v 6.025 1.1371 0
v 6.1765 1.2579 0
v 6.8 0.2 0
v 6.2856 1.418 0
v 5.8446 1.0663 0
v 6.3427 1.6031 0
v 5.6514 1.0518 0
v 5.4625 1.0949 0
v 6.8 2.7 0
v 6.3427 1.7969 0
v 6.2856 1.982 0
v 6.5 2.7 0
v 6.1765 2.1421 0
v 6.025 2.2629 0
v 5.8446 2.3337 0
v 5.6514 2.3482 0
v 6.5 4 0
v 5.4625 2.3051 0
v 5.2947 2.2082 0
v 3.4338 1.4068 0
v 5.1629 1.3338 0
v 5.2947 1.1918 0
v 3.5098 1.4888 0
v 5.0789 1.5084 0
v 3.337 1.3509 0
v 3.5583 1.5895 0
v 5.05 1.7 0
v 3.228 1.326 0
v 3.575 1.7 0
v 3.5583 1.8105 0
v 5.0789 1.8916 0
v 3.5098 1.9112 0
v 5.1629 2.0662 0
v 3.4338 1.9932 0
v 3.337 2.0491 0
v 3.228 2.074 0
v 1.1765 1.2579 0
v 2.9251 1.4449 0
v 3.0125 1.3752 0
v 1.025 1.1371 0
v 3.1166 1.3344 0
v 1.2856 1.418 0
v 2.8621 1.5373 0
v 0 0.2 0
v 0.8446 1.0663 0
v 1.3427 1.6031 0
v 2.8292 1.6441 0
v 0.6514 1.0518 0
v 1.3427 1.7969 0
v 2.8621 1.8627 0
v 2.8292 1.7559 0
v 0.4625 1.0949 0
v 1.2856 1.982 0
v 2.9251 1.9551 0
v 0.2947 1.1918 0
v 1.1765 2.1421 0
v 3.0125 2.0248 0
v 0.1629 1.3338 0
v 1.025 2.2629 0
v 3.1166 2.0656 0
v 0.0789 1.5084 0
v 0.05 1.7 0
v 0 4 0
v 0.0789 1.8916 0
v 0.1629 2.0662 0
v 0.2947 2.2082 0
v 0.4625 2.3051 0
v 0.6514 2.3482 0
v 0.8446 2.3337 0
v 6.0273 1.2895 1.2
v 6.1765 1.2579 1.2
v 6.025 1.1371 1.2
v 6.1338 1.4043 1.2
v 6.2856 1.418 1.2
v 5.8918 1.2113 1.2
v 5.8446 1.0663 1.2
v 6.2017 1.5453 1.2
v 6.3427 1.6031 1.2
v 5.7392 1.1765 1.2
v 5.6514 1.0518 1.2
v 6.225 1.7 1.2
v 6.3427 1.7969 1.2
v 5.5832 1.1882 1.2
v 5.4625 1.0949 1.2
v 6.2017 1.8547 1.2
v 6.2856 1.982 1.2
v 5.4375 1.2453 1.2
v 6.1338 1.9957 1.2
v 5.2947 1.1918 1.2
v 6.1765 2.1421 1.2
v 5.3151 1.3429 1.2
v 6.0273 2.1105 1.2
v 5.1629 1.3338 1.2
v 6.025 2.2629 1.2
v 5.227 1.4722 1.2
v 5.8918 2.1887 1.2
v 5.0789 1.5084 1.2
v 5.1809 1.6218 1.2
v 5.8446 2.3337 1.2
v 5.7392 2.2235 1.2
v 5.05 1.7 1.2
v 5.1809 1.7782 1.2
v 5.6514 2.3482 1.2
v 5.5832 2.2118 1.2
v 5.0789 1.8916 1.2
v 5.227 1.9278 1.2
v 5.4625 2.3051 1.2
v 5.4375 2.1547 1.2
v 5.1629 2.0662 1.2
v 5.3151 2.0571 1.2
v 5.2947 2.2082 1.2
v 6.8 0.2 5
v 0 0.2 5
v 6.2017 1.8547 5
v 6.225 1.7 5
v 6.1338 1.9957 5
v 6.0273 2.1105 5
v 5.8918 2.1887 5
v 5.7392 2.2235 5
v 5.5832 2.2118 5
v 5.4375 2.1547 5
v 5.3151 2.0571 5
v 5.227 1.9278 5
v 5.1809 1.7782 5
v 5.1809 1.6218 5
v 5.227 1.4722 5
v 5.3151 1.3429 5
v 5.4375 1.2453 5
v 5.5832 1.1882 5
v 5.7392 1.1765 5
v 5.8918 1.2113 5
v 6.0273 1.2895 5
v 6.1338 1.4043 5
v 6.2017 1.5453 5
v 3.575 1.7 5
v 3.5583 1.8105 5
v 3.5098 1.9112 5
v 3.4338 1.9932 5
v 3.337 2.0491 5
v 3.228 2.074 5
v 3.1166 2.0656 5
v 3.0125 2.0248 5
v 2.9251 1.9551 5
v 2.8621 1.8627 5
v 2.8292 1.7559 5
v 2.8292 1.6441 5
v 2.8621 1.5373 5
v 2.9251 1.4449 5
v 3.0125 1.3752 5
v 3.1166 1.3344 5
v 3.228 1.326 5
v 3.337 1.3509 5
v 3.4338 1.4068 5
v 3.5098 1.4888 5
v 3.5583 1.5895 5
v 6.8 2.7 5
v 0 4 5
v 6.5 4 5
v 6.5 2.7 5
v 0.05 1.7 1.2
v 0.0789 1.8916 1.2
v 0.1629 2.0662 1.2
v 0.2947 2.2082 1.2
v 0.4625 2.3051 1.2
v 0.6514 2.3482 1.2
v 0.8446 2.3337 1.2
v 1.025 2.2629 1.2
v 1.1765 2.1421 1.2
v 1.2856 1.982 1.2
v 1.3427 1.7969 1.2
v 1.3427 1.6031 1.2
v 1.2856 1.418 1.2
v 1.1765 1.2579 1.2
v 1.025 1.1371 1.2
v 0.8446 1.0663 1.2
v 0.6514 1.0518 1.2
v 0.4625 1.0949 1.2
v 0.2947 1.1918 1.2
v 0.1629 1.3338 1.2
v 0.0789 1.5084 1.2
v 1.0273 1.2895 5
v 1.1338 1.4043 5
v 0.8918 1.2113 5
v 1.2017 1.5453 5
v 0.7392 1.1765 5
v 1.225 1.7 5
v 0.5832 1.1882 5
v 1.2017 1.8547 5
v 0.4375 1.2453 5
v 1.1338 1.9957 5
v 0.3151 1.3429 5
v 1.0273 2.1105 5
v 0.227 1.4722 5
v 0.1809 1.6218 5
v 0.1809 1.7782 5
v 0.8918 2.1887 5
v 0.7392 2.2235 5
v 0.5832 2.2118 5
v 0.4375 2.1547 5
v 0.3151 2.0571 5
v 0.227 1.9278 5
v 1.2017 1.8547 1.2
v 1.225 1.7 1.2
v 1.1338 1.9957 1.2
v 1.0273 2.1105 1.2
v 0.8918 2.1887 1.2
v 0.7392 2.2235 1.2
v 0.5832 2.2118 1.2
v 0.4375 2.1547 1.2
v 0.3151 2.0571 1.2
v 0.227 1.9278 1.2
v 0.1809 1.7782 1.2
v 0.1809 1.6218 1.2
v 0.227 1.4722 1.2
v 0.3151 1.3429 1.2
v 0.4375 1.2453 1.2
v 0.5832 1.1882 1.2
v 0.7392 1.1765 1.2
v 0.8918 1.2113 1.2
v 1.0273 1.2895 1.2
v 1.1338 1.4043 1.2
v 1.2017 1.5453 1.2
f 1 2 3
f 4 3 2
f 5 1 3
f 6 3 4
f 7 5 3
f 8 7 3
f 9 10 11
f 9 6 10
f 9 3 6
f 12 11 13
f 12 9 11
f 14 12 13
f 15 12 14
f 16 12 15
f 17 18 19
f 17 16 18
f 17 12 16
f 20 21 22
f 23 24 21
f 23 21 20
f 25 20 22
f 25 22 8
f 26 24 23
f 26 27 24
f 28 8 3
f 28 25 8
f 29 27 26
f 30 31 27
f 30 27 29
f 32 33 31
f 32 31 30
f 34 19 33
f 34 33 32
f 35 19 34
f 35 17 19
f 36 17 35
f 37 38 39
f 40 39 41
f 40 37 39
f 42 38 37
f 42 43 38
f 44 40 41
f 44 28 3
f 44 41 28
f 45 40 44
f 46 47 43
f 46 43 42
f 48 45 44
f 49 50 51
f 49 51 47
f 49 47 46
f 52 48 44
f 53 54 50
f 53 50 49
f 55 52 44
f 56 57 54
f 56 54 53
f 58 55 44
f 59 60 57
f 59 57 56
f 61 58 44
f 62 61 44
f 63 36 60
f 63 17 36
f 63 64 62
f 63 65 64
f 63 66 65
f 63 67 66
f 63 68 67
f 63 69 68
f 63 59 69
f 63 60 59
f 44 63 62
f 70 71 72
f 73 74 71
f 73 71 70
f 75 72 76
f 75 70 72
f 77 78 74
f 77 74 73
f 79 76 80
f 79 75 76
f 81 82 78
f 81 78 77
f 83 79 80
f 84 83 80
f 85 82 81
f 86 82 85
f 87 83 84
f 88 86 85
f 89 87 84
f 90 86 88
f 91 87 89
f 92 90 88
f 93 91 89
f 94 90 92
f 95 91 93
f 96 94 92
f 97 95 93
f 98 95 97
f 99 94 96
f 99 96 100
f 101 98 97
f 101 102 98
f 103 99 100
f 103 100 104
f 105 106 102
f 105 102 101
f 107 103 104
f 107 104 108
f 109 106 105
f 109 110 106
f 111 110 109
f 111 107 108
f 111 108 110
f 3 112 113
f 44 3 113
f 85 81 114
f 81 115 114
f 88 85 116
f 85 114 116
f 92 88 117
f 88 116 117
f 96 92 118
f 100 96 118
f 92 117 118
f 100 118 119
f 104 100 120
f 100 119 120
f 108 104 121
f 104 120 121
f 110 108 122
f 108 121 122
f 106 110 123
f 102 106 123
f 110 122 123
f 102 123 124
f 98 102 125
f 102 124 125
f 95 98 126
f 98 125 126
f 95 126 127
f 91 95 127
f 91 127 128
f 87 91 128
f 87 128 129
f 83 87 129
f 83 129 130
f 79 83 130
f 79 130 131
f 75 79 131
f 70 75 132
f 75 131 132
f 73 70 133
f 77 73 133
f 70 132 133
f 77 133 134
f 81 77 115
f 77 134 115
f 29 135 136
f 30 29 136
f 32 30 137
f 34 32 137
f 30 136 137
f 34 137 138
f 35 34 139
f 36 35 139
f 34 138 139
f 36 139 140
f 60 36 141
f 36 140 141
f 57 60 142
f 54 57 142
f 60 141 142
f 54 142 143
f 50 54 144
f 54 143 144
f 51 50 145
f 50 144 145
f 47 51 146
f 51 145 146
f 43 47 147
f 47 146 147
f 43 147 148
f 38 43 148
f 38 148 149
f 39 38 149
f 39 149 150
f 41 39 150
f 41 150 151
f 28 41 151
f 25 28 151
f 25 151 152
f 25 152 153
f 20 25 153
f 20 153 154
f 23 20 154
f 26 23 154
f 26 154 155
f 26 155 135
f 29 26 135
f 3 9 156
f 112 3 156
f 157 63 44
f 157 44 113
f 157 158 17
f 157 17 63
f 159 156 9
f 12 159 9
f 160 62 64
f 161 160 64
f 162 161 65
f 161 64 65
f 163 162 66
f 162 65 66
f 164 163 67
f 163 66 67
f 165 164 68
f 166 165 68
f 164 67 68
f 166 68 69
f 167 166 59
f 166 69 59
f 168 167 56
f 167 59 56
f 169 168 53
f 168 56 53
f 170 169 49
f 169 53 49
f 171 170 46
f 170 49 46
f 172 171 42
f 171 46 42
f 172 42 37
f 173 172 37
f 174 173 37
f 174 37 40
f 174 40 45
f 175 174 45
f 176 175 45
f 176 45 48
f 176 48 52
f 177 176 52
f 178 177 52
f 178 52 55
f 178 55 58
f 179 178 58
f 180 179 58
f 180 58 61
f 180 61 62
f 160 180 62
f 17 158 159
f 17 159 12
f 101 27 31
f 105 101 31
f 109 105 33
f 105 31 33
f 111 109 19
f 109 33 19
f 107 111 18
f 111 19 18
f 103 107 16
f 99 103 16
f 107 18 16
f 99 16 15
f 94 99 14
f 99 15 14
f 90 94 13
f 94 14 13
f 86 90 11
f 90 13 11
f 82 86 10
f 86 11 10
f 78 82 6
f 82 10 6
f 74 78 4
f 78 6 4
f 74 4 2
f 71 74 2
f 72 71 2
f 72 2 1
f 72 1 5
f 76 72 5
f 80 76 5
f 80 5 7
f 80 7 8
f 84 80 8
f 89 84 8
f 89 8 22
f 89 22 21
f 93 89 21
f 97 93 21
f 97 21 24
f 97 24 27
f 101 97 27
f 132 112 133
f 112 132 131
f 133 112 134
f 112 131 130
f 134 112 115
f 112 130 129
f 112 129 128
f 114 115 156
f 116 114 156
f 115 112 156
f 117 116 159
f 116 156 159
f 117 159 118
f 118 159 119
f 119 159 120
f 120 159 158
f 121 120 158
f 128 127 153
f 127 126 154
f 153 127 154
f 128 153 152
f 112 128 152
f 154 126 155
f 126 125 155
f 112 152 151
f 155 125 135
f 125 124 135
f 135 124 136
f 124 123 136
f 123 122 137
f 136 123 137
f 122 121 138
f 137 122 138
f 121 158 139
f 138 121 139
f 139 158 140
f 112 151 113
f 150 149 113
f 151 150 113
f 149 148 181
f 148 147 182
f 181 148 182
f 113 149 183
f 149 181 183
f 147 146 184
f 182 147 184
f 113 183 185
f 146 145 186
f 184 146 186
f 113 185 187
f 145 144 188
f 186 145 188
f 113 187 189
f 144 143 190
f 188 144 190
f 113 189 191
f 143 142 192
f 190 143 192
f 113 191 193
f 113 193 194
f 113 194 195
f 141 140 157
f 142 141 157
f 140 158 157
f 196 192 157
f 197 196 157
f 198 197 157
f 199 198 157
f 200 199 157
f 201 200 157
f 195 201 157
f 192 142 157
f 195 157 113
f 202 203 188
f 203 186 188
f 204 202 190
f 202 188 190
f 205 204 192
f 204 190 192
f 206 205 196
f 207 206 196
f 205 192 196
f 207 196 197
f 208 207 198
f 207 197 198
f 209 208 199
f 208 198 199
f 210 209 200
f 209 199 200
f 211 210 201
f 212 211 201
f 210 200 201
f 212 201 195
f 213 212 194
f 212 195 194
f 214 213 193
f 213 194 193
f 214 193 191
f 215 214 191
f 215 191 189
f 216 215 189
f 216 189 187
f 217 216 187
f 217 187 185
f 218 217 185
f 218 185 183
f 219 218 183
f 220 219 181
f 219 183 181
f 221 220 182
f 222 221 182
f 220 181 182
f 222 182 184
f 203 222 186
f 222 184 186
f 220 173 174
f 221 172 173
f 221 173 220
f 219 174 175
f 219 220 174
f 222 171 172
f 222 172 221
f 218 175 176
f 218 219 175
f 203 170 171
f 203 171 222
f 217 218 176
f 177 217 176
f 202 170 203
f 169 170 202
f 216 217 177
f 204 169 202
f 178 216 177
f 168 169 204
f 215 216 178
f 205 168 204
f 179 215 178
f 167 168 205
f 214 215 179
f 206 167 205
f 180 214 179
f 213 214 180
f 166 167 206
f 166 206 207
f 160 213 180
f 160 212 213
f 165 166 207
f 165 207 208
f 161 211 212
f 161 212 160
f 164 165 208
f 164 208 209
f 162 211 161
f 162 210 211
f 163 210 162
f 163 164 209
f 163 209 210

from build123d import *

# Parameters (mm, degrees)
SKETCH1_W                = 6.8
SKETCH1_H                = 5
BOSS_EXTRUDE1_DEPTH      = 3.8
HOLE1_D                  = 1.05
HOLE1_CBORE_D            = 1.3
HOLE1_CBORE_DEPTH        = 1.2
SKETCH20_W               = 5
SKETCH20_H               = 1.3
CUT_EXTRUDE11_DEPTH      = 0.3
M1_0X0_25_TAPPED_HOLE1_D = 0.75


with BuildPart() as part:
    # Sketch1 → Boss-Extrude1 (new body)
    with BuildSketch(Plane(origin=(0, 4, 0), x_dir=(-1, 0, 0), z_dir=(0, 1, 0))):
        with Locations((-3.4, 2.5)):
            Rectangle(SKETCH1_W, SKETCH1_H)
    extrude(amount=-BOSS_EXTRUDE1_DEPTH)

    # Hole1 (through all)
    with Locations(Plane(origin=(0, 0, 0), x_dir=(-1, 0, 0), z_dir=(0, 0, -1))):
        with Locations((-5.7, 1.7), (-0.7, 1.7)):
            CounterBoreHole(HOLE1_D / 2, HOLE1_CBORE_D / 2, HOLE1_CBORE_DEPTH)

    # Sketch20 → Cut-Extrude11 (cut)
    with BuildSketch(Plane(origin=(6.8, 0, 0), x_dir=(0, 0, -1), z_dir=(1, 0, 0))):
        with Locations((-2.5, 3.35)):
            Rectangle(SKETCH20_W, SKETCH20_H)
    extrude(amount=-CUT_EXTRUDE11_DEPTH, mode=Mode.SUBTRACT)

    # M1.0x0.25 Tapped Hole1 (through all)
    with Locations(Plane(origin=(0, 0, 0), x_dir=(-1, 0, 0), z_dir=(0, 0, -1))):
        with Locations((-3.2, 1.7)):
            Hole(M1_0X0_25_TAPPED_HOLE1_D / 2)


solid = part.part
